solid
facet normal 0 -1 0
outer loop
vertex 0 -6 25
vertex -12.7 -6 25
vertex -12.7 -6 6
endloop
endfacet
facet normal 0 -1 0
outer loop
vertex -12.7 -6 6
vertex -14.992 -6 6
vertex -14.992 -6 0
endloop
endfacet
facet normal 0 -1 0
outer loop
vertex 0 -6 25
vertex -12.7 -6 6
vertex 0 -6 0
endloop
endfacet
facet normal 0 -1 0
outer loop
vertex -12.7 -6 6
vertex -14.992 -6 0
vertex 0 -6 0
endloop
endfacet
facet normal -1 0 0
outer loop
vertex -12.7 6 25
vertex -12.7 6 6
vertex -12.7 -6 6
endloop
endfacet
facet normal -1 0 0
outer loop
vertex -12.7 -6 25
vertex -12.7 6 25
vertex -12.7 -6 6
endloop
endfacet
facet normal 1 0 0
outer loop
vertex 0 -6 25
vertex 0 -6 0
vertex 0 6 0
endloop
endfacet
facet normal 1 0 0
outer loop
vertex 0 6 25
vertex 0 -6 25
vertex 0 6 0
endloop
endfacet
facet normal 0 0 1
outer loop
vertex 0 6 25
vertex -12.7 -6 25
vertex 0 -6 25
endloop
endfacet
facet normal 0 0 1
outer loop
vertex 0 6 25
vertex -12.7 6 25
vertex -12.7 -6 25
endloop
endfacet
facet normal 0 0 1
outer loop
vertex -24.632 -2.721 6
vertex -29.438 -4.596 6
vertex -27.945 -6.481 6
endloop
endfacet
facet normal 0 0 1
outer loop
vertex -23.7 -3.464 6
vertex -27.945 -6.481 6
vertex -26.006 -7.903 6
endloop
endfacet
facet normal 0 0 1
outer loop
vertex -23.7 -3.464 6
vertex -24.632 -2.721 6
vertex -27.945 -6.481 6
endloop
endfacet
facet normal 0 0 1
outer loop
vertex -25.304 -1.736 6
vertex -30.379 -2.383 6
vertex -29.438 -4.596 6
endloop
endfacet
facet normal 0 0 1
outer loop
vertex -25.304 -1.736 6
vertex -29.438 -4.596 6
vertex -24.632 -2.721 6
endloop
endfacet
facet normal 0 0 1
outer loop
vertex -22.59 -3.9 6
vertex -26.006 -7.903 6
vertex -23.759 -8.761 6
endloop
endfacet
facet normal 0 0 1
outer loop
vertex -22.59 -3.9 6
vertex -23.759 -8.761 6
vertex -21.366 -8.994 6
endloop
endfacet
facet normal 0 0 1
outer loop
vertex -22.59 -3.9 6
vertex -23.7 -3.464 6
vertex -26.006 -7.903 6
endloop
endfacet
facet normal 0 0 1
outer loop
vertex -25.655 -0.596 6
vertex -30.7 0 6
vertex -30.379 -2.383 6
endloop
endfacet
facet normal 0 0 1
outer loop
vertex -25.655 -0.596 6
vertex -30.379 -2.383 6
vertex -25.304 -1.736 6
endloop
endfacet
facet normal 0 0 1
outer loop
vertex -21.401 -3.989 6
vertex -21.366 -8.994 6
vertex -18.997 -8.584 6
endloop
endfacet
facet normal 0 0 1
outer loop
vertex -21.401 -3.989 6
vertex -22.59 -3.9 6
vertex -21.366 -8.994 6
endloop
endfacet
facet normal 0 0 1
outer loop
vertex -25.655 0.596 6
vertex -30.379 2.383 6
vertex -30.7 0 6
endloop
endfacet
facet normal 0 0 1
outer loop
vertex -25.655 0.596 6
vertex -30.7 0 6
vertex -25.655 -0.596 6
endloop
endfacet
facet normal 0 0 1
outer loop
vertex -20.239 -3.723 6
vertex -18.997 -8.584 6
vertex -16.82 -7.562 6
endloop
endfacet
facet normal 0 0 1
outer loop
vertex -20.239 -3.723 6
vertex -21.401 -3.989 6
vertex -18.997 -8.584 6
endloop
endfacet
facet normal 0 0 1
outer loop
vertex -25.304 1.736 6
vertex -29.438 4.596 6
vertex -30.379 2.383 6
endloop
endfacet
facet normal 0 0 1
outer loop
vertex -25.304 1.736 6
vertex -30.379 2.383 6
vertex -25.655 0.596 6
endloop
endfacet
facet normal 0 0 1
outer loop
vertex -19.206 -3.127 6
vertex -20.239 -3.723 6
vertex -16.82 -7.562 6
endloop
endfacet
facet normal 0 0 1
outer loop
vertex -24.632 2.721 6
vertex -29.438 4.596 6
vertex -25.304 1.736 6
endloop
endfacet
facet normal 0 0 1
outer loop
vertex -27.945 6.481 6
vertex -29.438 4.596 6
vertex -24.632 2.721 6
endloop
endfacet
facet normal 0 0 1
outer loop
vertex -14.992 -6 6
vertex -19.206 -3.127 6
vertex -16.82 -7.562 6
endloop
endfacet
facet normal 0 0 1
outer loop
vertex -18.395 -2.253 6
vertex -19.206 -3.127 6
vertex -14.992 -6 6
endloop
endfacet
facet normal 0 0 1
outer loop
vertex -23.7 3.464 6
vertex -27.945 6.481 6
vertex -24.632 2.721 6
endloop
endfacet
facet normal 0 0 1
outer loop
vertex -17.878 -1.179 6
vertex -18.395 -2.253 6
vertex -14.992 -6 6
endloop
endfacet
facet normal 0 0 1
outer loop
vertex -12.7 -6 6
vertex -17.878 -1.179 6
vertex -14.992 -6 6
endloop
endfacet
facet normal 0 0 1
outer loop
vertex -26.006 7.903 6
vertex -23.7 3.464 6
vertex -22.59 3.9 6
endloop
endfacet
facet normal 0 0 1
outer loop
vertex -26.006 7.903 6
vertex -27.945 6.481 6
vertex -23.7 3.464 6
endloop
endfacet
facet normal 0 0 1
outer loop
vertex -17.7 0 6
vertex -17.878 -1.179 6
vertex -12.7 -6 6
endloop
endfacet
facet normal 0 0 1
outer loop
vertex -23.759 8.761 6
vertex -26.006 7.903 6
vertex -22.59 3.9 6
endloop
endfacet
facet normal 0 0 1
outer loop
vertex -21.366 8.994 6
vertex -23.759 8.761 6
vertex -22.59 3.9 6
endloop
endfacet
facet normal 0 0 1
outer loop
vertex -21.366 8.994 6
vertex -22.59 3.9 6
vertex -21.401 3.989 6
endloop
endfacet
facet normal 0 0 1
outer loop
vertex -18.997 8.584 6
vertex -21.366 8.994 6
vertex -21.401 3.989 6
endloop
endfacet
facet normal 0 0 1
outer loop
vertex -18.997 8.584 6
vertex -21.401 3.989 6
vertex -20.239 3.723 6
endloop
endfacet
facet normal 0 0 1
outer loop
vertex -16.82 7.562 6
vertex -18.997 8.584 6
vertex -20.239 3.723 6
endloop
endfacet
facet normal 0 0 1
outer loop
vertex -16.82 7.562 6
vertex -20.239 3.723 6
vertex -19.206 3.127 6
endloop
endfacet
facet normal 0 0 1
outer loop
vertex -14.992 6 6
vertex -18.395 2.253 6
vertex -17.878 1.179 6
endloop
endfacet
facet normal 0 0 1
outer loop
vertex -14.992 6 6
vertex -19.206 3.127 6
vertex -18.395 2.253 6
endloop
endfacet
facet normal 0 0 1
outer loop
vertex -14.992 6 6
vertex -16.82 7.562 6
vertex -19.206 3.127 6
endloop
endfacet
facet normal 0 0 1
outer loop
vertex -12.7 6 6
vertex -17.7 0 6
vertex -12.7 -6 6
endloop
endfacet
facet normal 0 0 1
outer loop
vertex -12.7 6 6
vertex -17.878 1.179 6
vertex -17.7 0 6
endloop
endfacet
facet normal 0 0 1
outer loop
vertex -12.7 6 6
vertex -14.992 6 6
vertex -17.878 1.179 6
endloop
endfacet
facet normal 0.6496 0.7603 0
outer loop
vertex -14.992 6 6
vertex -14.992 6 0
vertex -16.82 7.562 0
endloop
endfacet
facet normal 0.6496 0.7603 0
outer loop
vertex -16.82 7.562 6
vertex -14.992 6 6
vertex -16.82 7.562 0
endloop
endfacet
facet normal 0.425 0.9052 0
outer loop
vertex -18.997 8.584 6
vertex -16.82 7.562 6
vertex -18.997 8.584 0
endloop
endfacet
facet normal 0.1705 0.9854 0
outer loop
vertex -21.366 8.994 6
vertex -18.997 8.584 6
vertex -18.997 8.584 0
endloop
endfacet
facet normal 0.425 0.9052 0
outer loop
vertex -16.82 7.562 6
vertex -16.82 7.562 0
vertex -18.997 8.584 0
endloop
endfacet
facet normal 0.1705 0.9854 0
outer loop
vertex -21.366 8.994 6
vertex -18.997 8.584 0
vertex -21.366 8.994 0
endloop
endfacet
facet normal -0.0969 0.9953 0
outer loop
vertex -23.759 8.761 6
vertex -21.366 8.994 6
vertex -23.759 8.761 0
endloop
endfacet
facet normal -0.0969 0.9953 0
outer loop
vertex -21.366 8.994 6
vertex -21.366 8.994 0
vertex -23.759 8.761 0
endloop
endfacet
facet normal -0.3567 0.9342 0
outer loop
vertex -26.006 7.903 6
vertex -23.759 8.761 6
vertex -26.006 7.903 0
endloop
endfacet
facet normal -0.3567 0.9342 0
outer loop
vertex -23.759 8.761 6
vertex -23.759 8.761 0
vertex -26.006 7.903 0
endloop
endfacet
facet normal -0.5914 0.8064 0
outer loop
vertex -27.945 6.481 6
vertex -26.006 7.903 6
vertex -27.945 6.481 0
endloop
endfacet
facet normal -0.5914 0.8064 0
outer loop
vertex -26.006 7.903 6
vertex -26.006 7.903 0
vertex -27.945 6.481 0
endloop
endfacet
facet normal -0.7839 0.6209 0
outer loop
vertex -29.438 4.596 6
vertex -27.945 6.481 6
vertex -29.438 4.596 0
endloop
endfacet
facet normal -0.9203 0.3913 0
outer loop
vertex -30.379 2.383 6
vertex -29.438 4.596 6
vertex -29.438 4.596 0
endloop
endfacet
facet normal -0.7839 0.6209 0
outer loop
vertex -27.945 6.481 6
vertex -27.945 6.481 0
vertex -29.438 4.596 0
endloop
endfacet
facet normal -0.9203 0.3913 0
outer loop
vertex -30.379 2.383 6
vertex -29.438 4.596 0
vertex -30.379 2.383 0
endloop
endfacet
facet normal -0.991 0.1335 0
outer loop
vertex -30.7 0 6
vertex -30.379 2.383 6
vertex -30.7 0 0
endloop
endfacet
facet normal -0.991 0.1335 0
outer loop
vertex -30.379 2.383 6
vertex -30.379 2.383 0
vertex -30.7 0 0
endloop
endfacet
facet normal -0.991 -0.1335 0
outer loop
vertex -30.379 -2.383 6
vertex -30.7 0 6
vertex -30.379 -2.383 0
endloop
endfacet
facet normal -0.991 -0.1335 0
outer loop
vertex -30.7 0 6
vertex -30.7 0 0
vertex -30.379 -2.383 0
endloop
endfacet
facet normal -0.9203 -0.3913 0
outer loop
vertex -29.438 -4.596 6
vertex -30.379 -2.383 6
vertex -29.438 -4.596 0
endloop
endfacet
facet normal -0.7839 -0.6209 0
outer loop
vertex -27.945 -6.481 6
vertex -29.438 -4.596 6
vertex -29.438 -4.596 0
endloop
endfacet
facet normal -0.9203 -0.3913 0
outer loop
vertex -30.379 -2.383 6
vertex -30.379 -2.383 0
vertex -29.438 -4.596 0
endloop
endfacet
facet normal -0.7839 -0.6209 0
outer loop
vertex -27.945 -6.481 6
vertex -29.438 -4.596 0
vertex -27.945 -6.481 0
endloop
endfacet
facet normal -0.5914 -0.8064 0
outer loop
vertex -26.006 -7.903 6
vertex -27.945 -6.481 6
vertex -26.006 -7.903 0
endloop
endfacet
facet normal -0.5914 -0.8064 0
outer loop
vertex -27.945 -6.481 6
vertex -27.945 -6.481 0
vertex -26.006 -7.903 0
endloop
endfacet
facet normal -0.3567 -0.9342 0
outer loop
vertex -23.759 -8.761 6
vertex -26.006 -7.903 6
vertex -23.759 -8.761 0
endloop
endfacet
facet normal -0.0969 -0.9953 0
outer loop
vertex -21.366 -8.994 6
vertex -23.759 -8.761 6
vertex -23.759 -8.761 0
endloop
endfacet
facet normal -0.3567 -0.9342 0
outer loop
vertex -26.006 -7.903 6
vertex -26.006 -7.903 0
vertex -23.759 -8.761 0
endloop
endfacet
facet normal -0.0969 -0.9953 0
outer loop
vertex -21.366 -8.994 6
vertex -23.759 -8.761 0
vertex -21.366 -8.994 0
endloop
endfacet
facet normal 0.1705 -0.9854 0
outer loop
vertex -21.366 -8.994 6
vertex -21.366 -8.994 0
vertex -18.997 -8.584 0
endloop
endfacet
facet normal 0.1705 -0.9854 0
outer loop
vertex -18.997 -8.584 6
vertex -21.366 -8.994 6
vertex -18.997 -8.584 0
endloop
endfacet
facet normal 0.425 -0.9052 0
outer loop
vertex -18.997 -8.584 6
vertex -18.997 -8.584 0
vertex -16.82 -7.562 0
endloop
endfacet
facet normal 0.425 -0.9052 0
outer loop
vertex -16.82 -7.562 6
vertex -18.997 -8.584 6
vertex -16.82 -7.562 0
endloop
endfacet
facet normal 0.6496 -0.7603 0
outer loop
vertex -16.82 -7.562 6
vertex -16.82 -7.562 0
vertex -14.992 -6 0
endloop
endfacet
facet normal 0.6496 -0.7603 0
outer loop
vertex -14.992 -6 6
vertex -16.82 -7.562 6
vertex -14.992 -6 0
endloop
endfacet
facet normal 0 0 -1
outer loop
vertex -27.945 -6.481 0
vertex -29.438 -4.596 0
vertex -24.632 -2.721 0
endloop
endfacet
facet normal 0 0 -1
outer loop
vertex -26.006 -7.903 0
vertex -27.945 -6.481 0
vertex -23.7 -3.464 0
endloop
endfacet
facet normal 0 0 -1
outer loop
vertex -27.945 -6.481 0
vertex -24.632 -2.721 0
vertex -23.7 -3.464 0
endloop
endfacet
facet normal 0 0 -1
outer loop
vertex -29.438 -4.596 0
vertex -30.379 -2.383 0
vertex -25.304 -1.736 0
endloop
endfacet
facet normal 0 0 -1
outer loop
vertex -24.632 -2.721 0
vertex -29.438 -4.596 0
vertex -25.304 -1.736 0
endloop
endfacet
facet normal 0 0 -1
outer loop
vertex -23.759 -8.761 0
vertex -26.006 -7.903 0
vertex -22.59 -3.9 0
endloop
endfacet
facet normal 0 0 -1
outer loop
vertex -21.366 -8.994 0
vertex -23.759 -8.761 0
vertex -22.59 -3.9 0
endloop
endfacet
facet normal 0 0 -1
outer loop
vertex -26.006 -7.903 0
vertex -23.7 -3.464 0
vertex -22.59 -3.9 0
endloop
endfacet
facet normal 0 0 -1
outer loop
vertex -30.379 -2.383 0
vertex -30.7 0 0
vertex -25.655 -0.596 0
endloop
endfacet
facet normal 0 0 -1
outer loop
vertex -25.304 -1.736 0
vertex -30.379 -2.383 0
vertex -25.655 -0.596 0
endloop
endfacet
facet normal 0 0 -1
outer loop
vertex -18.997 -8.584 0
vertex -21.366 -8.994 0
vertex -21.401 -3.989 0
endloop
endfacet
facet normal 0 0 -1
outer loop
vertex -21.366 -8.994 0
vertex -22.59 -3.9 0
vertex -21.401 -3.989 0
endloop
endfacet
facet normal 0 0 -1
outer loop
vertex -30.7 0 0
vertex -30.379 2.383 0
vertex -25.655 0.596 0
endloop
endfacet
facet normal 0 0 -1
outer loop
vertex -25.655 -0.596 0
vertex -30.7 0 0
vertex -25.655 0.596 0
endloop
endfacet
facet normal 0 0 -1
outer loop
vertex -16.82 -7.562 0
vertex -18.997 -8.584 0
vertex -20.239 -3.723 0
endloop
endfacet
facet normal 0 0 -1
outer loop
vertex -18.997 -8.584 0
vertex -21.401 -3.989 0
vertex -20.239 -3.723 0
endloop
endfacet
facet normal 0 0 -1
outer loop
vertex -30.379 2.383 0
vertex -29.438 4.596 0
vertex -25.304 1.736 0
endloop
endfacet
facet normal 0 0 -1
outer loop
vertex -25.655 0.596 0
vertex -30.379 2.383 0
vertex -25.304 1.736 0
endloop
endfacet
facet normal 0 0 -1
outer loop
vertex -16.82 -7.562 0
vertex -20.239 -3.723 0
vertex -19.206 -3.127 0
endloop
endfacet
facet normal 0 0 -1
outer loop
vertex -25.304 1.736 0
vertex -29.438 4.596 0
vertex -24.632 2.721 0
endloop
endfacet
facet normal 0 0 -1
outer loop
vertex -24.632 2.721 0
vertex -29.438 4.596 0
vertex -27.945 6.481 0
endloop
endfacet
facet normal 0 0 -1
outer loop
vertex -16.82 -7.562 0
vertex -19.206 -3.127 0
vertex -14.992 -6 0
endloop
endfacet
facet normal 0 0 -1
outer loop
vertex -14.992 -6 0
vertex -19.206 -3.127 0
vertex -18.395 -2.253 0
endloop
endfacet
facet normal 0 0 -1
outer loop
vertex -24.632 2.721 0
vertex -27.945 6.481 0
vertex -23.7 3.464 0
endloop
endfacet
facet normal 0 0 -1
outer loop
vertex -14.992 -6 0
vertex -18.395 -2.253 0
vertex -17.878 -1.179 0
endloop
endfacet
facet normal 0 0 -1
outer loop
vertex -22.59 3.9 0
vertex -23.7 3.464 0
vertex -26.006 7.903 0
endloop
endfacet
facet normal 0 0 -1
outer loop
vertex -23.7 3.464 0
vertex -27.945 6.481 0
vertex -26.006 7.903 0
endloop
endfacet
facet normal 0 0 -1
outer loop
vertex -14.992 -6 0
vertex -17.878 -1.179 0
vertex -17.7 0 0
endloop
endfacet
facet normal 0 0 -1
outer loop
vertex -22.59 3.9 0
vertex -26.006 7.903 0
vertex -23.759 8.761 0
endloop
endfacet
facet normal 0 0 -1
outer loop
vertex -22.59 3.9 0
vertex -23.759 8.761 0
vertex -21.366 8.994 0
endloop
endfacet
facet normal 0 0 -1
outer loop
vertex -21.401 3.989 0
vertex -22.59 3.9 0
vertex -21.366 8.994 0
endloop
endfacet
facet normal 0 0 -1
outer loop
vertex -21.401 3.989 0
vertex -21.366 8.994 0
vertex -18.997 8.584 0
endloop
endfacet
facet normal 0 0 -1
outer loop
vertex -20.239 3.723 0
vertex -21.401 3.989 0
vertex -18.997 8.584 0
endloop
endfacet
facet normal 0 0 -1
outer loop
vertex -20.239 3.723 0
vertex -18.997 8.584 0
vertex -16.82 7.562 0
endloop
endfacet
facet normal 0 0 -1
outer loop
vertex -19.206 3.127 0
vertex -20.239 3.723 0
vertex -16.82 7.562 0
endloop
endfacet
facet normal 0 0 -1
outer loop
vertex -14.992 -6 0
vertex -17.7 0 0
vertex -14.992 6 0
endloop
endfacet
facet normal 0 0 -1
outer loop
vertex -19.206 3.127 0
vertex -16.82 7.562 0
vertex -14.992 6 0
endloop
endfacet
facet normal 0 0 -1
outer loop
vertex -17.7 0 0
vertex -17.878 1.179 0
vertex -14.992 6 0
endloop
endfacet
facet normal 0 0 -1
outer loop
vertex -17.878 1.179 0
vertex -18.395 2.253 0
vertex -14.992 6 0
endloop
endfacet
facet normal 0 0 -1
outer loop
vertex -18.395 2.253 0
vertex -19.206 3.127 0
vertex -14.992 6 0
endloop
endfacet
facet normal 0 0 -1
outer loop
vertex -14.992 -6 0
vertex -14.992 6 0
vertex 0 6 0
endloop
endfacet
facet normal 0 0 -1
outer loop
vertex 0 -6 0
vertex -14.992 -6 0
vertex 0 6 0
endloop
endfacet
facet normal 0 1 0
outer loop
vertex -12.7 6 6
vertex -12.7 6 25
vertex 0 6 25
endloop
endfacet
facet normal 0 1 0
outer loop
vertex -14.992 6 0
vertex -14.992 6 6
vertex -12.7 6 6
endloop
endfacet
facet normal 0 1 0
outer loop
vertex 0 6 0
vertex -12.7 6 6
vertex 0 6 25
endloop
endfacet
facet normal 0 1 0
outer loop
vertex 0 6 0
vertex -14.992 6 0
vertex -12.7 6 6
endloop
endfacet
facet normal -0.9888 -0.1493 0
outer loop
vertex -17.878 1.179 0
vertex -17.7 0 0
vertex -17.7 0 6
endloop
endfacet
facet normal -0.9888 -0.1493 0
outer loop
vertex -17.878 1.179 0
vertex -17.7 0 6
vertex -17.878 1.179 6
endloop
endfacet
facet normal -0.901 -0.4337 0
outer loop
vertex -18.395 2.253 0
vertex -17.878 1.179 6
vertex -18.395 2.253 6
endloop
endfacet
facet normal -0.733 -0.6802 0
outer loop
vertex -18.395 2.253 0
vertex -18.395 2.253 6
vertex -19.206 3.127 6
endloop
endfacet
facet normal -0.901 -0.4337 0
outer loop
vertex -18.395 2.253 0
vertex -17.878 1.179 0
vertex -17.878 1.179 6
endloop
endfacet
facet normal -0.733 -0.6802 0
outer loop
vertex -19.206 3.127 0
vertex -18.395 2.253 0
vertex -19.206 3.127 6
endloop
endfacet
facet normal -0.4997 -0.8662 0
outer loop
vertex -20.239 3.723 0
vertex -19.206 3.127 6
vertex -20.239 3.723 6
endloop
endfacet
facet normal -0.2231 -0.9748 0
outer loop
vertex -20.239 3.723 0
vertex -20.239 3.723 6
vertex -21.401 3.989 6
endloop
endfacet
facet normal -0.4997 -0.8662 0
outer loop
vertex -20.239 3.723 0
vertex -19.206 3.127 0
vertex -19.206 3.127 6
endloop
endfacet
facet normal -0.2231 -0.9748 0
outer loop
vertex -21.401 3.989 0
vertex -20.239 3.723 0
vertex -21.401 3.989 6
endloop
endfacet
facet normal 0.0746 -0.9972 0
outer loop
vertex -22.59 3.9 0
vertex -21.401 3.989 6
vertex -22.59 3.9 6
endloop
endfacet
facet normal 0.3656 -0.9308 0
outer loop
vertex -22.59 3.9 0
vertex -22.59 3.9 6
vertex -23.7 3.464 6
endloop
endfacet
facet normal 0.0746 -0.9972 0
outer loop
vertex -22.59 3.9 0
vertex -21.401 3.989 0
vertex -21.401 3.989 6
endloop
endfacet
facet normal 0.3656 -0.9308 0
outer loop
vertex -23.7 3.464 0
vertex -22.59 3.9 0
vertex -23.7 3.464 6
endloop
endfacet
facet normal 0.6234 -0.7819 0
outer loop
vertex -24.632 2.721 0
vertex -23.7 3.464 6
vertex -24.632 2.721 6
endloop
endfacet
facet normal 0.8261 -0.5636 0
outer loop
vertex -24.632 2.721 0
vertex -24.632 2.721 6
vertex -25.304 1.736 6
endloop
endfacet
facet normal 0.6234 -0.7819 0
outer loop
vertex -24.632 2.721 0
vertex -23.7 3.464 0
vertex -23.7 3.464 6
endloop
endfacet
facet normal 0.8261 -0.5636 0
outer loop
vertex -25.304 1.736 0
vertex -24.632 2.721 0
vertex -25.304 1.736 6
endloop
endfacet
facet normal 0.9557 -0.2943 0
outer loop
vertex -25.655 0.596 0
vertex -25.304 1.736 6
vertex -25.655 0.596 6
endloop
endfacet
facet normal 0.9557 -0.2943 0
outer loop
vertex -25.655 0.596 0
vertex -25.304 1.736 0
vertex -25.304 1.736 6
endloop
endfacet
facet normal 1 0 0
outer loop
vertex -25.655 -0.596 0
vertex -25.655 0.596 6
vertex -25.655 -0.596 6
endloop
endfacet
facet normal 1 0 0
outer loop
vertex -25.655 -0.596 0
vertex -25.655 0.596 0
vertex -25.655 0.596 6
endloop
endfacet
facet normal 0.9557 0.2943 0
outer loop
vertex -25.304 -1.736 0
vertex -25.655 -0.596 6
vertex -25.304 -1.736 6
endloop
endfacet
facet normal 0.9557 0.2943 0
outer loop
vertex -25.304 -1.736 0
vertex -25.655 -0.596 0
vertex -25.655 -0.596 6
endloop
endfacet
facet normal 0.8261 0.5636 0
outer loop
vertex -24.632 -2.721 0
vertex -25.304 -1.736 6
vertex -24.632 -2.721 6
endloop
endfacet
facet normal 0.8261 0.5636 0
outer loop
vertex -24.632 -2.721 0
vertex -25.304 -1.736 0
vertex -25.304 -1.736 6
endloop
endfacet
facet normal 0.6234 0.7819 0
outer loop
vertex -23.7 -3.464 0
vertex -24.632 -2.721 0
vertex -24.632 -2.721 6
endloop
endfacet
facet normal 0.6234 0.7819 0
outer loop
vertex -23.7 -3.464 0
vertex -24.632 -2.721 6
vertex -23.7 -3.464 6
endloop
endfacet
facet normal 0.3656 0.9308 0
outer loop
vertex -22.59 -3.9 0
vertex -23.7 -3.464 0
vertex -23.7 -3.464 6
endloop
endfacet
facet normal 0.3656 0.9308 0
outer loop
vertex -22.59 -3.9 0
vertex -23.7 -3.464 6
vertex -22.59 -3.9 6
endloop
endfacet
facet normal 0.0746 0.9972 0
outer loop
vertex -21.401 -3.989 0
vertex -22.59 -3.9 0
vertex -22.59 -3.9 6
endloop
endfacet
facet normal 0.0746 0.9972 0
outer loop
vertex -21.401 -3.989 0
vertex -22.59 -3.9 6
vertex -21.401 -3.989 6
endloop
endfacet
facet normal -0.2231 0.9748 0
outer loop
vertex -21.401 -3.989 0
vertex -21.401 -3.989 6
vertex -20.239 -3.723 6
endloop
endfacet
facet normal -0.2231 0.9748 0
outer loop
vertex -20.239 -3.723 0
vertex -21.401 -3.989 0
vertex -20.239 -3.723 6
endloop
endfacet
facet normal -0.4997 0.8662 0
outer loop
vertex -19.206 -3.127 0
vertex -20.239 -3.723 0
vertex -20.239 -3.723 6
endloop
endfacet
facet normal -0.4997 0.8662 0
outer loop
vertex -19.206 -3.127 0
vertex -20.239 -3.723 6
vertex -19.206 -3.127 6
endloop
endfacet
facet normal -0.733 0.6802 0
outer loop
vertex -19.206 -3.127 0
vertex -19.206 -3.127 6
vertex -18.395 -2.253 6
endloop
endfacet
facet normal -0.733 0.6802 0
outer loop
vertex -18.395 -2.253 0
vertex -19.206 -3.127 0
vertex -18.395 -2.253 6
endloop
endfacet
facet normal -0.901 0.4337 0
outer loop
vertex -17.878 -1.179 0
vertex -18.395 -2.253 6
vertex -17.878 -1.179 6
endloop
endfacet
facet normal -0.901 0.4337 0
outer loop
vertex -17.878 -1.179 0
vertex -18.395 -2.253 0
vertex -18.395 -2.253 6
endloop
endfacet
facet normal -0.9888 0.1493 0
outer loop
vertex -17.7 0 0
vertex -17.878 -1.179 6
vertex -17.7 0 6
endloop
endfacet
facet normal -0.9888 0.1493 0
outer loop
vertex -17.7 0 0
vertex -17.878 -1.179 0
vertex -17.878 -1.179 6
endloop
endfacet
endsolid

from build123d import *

# Parameters (mm, degrees)
F0_R     = 4
F1_DEPTH = 6
F2_DEPTH = 6
F0_W     = 12.7
F0_H     = 6
F3_DEPTH = 25


with BuildPart() as f1:
    # F0 (on Top) → F1 (new body)
    with BuildSketch(Plane.XY):
        with BuildLine():
            ThreePointArc((-14.991796, -6), (-13.292449, -3.211399), (-12.7, 0))
            ThreePointArc((-12.7, 0), (-13.292449, 3.211399), (-14.991796, 6))
            ThreePointArc((-14.991796, 6), (-30.7, 0), (-14.991796, -6))
        make_face()
        with Locations((-21.7, 0)):
            Circle(F0_R, mode=Mode.SUBTRACT)
    extrude(amount=F1_DEPTH)

    # F0 (on Top) → F2 (join)
    with BuildSketch(Plane.XY):
        with BuildLine():
            Line((-12.7, -6), (-12.7, 0))
            ThreePointArc((-12.7, 0), (-13.292449, -3.211399), (-14.991796, -6))
            Line((-14.991796, -6), (-12.7, -6))
        make_face()
        with BuildLine():
            ThreePointArc((-14.991796, 6), (-13.292449, 3.211399), (-12.7, 0))
            Line((-12.7, 0), (-12.7, 6))
            Line((-12.7, 6), (-14.991796, 6))
        make_face()
    extrude(amount=F2_DEPTH)

    # F0 (on Top) → F3 (join)
    with BuildSketch(Plane.XY):
        with Locations((-6.35, -3)):
            Rectangle(F0_W, F0_H)
        with Locations((-6.35, 3)):
            Rectangle(F0_W, F0_H)
    extrude(amount=F3_DEPTH)


solid = f1.part
